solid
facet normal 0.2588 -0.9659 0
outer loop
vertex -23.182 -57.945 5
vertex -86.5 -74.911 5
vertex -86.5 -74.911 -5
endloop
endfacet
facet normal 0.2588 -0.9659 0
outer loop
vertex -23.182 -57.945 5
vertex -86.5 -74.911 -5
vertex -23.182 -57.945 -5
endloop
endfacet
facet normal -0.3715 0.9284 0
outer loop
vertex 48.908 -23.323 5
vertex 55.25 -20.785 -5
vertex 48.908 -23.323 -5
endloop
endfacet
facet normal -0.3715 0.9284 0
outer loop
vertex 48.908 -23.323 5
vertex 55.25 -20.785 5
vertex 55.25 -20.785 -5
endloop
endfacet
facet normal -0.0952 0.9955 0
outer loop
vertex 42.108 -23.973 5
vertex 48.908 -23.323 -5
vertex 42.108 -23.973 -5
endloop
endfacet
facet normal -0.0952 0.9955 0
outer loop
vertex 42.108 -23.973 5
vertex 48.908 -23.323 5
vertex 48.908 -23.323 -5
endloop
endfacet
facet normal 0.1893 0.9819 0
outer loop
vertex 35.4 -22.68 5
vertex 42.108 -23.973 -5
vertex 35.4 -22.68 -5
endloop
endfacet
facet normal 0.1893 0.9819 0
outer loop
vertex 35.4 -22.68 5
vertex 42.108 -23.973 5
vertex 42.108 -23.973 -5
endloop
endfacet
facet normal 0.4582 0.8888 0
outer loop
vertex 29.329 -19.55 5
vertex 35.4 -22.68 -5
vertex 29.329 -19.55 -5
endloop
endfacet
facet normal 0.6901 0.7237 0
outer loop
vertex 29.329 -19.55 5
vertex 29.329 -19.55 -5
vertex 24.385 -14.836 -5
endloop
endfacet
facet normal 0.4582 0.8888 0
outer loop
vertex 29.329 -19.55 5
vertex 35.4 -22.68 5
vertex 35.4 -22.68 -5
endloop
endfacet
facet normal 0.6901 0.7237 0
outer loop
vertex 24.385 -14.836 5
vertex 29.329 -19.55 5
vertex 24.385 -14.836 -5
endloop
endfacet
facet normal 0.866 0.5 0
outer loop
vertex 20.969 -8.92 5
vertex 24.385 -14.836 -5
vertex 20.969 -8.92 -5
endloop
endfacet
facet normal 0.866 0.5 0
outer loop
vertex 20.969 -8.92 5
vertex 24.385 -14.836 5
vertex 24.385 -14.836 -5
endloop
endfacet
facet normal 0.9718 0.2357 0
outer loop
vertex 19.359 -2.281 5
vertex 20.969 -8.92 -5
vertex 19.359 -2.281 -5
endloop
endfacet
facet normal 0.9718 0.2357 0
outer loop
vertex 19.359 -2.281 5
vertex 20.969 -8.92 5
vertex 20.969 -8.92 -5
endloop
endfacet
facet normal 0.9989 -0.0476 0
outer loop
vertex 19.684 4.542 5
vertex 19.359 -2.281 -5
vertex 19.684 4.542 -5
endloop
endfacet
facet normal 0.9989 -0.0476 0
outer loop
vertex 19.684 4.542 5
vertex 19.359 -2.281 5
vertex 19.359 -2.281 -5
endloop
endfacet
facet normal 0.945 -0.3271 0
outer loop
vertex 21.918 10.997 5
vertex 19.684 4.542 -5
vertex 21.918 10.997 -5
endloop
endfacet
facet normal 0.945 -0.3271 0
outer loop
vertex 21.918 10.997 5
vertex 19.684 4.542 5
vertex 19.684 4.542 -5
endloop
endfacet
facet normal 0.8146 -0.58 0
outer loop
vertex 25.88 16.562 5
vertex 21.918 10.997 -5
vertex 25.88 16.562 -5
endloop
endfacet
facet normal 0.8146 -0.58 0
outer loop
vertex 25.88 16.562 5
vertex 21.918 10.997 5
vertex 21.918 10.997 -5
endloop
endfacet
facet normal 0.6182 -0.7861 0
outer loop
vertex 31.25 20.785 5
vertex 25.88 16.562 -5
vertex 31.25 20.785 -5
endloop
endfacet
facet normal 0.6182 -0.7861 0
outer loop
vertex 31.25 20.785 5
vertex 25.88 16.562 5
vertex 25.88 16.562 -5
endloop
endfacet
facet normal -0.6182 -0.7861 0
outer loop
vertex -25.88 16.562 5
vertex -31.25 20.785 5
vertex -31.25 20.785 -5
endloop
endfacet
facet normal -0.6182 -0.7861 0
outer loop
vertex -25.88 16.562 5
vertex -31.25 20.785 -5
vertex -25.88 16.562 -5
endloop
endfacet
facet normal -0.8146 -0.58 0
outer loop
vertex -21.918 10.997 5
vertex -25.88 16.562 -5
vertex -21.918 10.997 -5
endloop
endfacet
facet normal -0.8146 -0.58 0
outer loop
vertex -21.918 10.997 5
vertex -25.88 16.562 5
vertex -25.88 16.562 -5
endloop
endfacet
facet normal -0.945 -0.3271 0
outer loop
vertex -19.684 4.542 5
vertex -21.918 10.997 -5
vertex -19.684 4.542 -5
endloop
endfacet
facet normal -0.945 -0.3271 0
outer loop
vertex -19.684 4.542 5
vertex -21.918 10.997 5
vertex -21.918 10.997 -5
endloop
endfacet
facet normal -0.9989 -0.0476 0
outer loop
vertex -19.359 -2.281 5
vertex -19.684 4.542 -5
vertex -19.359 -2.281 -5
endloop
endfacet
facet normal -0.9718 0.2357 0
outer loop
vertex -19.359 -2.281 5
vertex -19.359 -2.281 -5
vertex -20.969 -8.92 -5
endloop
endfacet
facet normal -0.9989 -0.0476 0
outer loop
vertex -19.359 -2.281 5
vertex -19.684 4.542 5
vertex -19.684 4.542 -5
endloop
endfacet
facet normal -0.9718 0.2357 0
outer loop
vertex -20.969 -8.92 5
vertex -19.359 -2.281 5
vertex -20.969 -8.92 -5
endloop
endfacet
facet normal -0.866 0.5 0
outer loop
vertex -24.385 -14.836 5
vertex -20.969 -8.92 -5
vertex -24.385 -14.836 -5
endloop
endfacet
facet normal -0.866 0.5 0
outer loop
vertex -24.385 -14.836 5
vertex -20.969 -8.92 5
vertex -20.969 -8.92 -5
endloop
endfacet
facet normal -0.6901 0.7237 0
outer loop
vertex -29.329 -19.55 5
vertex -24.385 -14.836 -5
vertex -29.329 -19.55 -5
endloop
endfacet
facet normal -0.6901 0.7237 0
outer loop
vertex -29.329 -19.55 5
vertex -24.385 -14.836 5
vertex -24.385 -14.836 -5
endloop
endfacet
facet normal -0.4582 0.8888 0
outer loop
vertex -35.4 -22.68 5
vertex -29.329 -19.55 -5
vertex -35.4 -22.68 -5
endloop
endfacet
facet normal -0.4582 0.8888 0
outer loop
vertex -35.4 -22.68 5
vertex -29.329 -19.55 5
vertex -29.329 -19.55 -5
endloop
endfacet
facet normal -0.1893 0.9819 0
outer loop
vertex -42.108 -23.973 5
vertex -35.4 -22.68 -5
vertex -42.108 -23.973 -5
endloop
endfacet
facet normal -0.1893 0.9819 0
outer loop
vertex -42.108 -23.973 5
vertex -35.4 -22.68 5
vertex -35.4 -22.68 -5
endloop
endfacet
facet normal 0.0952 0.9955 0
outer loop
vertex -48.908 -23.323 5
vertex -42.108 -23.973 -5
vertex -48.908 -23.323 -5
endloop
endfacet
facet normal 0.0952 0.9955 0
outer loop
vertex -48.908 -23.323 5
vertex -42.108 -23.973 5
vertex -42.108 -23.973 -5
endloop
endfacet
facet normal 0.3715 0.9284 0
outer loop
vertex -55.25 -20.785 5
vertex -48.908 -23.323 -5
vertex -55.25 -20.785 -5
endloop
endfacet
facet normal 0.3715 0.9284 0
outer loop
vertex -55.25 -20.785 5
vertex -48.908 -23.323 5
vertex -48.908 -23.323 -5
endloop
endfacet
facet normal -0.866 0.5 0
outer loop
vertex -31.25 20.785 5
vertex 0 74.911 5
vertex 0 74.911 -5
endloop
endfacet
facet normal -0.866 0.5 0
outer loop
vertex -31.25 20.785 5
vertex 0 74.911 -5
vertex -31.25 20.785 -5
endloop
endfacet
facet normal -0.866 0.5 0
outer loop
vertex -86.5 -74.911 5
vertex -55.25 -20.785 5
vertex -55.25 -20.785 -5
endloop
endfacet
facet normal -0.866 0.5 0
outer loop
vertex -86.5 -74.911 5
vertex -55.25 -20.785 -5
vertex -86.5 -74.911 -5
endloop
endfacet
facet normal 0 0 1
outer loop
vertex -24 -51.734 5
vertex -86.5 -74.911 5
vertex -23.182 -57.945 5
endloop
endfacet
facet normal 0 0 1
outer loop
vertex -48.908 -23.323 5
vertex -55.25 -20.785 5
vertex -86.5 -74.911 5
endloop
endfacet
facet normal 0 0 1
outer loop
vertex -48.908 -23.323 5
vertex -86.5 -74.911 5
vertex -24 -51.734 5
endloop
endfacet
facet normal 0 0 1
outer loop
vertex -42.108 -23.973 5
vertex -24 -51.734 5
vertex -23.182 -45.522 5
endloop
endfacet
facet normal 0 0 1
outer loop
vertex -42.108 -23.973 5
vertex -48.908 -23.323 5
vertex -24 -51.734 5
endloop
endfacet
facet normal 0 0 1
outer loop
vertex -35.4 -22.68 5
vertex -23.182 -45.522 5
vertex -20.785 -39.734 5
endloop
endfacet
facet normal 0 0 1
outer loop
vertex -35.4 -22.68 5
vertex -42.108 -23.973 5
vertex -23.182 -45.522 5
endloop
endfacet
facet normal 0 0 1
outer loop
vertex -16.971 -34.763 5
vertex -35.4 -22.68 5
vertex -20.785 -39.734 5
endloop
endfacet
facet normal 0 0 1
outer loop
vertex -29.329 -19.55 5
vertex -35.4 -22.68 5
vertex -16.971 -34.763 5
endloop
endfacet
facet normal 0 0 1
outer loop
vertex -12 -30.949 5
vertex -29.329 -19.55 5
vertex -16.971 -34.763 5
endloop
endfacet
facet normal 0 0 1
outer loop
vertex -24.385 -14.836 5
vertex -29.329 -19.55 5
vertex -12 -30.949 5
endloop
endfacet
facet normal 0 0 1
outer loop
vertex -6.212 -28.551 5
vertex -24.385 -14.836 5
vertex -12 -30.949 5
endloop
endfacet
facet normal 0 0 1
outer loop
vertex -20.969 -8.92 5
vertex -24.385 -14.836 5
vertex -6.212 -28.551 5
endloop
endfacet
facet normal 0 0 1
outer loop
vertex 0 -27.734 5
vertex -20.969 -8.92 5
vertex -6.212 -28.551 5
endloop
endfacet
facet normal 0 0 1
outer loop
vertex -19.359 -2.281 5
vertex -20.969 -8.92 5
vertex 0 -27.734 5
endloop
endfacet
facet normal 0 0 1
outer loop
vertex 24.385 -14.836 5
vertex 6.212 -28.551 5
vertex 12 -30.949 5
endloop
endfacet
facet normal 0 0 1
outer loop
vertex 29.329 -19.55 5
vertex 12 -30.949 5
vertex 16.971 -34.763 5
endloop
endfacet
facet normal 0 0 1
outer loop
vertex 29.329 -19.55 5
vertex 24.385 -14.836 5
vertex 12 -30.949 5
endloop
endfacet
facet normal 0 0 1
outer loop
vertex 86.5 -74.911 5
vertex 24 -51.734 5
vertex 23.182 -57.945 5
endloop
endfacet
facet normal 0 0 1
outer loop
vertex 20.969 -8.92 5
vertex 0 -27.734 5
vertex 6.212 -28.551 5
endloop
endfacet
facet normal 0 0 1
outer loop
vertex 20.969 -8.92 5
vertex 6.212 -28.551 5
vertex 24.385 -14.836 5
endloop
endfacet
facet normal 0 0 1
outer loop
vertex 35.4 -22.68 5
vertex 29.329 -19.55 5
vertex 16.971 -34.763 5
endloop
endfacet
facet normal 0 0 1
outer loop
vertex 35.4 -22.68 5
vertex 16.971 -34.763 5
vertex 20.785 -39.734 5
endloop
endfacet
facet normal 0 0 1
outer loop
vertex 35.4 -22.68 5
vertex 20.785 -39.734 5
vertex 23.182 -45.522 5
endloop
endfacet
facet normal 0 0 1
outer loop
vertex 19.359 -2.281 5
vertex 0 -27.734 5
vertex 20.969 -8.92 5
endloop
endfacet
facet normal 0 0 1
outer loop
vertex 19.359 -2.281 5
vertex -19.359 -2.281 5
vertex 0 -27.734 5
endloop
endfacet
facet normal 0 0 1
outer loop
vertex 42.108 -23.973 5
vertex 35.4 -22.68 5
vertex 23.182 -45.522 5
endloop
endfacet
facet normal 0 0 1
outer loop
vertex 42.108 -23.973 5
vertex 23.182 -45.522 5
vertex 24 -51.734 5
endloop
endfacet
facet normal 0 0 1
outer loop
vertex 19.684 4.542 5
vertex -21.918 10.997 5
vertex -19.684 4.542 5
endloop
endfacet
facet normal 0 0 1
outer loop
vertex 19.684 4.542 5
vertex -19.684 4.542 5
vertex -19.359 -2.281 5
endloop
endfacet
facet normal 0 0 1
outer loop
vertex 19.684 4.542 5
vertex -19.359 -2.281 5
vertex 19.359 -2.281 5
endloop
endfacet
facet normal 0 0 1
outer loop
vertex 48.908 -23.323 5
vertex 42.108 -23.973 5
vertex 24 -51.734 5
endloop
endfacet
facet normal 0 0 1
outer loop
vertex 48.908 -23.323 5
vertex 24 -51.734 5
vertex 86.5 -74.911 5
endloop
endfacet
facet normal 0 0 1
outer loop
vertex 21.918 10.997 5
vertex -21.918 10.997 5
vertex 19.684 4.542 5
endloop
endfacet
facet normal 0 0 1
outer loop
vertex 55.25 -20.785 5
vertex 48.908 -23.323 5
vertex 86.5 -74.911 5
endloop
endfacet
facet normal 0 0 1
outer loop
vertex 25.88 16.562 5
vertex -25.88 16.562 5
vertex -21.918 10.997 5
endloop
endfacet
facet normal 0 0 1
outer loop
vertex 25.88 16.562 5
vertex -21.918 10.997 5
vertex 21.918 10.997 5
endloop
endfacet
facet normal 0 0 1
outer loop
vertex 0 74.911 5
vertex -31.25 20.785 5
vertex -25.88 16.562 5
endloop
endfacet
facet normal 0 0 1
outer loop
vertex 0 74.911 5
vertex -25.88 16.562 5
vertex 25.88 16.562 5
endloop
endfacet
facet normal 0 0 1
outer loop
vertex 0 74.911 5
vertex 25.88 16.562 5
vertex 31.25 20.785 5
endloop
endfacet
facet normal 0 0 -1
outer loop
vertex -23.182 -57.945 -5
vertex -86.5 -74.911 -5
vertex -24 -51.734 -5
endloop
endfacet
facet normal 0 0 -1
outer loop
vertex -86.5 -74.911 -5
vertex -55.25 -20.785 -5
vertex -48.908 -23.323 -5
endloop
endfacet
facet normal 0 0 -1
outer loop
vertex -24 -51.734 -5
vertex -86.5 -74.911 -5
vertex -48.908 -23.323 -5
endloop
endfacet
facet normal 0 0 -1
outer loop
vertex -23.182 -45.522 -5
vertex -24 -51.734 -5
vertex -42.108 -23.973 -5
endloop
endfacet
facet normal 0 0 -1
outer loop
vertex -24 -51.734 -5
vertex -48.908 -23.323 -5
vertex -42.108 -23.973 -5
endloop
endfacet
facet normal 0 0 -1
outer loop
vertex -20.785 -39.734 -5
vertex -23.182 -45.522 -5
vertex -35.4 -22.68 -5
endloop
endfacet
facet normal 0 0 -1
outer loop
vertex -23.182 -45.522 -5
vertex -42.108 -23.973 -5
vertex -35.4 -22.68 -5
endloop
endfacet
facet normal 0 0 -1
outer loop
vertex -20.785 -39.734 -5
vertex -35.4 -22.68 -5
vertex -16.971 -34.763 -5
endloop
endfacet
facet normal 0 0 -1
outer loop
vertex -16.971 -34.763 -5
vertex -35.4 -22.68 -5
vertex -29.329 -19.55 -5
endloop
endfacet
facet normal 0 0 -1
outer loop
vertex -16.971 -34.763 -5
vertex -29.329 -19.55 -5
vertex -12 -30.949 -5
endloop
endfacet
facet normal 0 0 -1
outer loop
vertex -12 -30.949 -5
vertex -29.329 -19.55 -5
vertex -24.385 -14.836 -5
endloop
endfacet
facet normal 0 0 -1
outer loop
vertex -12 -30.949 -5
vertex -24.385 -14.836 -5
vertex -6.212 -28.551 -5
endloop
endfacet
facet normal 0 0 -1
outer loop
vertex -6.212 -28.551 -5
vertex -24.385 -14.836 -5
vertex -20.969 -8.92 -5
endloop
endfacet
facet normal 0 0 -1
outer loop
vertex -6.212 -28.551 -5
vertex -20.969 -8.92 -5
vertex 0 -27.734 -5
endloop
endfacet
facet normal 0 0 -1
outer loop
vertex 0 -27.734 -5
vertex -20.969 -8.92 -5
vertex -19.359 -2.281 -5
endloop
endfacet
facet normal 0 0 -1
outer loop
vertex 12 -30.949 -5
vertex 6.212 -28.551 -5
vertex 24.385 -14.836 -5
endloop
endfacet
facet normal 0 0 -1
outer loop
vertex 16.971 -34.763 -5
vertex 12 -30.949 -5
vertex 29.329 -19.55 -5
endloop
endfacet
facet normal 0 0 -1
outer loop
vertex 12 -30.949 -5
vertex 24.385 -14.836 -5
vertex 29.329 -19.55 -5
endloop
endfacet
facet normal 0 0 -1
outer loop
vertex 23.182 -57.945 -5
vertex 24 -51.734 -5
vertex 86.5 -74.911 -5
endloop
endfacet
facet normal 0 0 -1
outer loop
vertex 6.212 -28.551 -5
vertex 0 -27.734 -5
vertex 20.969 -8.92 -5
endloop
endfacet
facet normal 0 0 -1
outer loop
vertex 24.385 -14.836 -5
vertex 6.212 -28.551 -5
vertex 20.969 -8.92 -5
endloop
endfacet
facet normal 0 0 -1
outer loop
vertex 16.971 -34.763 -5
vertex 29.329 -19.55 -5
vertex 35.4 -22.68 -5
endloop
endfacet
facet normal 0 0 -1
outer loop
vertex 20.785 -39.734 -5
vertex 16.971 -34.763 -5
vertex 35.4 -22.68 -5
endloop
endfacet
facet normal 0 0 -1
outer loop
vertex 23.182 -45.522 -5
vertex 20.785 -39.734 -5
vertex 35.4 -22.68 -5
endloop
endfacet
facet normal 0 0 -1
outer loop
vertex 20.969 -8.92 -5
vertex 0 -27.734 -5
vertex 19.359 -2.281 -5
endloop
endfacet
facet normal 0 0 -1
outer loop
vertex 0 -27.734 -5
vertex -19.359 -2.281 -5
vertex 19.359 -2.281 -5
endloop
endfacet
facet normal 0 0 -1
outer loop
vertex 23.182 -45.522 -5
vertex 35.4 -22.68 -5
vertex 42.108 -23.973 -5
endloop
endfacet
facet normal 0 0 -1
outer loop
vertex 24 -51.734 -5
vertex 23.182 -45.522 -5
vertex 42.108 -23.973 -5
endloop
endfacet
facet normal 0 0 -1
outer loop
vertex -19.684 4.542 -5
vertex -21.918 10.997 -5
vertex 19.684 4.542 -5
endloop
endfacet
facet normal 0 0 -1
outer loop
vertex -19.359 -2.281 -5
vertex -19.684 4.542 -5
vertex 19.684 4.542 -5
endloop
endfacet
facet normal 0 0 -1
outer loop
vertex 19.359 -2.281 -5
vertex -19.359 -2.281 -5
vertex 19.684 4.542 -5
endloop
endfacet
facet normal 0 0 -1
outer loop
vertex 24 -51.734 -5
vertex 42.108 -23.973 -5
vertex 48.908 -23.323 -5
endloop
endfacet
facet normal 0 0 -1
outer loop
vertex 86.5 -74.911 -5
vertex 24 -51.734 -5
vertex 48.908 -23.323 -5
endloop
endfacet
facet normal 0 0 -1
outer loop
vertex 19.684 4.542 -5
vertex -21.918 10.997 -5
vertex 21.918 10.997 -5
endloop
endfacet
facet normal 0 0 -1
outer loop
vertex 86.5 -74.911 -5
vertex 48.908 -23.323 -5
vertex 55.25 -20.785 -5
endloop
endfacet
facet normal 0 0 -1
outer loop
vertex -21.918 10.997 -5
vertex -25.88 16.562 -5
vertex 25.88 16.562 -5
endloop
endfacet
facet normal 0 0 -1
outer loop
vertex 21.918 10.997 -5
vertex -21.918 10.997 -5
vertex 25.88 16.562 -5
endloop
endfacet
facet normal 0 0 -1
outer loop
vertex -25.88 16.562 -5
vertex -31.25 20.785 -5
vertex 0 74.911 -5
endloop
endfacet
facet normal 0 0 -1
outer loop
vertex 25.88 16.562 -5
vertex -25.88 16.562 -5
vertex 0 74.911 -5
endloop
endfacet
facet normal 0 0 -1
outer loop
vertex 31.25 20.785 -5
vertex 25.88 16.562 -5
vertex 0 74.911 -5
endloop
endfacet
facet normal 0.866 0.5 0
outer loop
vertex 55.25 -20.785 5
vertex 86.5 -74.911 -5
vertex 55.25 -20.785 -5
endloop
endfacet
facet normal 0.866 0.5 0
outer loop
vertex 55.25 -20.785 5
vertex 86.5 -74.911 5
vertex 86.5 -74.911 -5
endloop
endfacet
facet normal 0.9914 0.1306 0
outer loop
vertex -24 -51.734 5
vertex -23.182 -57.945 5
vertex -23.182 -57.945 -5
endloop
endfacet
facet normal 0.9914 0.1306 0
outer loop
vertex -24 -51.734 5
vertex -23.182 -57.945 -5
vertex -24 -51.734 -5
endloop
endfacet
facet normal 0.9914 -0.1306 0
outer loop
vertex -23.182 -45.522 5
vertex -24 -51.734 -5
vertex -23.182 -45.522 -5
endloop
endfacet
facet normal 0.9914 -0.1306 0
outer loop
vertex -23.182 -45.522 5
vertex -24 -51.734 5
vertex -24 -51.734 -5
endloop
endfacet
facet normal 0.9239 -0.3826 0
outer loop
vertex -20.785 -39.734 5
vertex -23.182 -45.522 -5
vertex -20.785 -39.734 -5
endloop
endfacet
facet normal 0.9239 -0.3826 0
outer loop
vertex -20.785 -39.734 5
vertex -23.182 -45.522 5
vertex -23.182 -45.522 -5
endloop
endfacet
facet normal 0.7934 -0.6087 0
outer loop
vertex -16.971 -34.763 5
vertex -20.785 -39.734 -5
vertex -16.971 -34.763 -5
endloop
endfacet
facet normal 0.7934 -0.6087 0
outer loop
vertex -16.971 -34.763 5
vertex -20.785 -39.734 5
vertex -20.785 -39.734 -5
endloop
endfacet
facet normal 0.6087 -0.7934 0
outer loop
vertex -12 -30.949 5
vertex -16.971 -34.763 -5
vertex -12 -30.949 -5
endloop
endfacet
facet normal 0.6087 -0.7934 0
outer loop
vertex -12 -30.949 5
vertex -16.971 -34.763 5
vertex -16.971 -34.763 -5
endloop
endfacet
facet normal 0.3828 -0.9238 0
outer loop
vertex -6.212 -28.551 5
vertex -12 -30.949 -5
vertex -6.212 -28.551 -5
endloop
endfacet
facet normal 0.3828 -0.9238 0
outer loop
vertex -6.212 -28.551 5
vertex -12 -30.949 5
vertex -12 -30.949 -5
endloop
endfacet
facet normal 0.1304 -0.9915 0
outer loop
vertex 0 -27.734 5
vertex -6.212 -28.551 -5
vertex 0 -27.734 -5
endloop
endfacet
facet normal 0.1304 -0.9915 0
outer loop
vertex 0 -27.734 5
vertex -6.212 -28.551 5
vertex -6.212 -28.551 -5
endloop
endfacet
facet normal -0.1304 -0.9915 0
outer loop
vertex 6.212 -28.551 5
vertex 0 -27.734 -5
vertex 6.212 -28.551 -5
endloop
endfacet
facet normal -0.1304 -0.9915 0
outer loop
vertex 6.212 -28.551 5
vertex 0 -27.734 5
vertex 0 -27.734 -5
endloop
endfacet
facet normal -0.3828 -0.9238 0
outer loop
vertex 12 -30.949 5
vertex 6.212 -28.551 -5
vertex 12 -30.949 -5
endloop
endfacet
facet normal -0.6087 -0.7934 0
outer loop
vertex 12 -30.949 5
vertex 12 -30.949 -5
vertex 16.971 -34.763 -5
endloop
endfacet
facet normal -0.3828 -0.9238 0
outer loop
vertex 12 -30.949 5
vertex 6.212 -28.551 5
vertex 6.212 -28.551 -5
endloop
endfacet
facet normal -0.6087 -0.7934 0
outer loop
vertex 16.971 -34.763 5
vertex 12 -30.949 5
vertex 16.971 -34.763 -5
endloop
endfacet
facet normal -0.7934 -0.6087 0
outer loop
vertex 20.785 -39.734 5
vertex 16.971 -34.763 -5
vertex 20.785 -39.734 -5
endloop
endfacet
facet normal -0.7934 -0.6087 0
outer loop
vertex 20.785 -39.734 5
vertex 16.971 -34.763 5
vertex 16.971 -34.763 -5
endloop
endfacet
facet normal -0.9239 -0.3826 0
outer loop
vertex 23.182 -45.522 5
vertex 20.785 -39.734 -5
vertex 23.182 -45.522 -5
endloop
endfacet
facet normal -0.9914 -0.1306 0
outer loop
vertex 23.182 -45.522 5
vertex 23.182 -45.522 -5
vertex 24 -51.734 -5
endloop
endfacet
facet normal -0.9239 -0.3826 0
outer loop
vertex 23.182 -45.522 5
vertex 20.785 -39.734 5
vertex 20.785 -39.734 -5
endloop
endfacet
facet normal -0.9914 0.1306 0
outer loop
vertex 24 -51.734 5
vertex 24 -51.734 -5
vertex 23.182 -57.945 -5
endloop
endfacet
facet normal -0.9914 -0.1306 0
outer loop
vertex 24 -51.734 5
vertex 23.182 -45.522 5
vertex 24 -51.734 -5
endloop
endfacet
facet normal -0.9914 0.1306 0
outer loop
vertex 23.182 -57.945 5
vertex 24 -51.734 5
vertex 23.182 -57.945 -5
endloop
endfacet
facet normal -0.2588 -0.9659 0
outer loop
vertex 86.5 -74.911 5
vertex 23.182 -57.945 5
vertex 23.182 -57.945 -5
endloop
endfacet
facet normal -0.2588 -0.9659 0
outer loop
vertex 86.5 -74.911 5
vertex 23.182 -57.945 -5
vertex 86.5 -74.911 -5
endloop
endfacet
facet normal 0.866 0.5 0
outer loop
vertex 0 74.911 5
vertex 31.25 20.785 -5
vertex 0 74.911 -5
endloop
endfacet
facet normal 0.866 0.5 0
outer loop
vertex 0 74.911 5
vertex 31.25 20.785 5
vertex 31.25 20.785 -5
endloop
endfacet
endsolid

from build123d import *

# Parameters (mm, degrees)
BOSS_EXTRUDE1_DEPTH = 5


with BuildPart() as part:
    # Sketch1 → Boss-Extrude1 (new, symmetric)
    with BuildSketch(Plane.XY):
        with BuildLine():
            Line((31.25, 20.784609691), (0, 74.911197427))
            Line((0, 74.911197427), (0, -27.733592282))
            ThreePointArc((0, -27.733592282), (19.040480167, -37.123317986), (23.182219831, -57.945249365))
            Line((23.182219831, -57.945249365), (86.5, -74.911197427))
            Line((86.5, -74.911197427), (55.25, -20.784609691))
            ThreePointArc((55.25, -20.784609691), (22.465390309, -12), (31.25, 20.784609691))
        make_face()
        with BuildLine():
            Line((0, -27.733592282), (0, 74.911197427))
            Line((0, 74.911197427), (-31.25, 20.784609691))
            ThreePointArc((-31.25, 20.784609691), (-22.465390309, -12), (-55.25, -20.784609691))
            Line((-55.25, -20.784609691), (-86.5, -74.911197427))
            Line((-86.5, -74.911197427), (-23.182219831, -57.945249365))
            ThreePointArc((-23.182219831, -57.945249365), (-19.040480167, -37.123317986), (0, -27.733592282))
        make_face()
    extrude(amount=BOSS_EXTRUDE1_DEPTH, both=True)


solid = part.part
